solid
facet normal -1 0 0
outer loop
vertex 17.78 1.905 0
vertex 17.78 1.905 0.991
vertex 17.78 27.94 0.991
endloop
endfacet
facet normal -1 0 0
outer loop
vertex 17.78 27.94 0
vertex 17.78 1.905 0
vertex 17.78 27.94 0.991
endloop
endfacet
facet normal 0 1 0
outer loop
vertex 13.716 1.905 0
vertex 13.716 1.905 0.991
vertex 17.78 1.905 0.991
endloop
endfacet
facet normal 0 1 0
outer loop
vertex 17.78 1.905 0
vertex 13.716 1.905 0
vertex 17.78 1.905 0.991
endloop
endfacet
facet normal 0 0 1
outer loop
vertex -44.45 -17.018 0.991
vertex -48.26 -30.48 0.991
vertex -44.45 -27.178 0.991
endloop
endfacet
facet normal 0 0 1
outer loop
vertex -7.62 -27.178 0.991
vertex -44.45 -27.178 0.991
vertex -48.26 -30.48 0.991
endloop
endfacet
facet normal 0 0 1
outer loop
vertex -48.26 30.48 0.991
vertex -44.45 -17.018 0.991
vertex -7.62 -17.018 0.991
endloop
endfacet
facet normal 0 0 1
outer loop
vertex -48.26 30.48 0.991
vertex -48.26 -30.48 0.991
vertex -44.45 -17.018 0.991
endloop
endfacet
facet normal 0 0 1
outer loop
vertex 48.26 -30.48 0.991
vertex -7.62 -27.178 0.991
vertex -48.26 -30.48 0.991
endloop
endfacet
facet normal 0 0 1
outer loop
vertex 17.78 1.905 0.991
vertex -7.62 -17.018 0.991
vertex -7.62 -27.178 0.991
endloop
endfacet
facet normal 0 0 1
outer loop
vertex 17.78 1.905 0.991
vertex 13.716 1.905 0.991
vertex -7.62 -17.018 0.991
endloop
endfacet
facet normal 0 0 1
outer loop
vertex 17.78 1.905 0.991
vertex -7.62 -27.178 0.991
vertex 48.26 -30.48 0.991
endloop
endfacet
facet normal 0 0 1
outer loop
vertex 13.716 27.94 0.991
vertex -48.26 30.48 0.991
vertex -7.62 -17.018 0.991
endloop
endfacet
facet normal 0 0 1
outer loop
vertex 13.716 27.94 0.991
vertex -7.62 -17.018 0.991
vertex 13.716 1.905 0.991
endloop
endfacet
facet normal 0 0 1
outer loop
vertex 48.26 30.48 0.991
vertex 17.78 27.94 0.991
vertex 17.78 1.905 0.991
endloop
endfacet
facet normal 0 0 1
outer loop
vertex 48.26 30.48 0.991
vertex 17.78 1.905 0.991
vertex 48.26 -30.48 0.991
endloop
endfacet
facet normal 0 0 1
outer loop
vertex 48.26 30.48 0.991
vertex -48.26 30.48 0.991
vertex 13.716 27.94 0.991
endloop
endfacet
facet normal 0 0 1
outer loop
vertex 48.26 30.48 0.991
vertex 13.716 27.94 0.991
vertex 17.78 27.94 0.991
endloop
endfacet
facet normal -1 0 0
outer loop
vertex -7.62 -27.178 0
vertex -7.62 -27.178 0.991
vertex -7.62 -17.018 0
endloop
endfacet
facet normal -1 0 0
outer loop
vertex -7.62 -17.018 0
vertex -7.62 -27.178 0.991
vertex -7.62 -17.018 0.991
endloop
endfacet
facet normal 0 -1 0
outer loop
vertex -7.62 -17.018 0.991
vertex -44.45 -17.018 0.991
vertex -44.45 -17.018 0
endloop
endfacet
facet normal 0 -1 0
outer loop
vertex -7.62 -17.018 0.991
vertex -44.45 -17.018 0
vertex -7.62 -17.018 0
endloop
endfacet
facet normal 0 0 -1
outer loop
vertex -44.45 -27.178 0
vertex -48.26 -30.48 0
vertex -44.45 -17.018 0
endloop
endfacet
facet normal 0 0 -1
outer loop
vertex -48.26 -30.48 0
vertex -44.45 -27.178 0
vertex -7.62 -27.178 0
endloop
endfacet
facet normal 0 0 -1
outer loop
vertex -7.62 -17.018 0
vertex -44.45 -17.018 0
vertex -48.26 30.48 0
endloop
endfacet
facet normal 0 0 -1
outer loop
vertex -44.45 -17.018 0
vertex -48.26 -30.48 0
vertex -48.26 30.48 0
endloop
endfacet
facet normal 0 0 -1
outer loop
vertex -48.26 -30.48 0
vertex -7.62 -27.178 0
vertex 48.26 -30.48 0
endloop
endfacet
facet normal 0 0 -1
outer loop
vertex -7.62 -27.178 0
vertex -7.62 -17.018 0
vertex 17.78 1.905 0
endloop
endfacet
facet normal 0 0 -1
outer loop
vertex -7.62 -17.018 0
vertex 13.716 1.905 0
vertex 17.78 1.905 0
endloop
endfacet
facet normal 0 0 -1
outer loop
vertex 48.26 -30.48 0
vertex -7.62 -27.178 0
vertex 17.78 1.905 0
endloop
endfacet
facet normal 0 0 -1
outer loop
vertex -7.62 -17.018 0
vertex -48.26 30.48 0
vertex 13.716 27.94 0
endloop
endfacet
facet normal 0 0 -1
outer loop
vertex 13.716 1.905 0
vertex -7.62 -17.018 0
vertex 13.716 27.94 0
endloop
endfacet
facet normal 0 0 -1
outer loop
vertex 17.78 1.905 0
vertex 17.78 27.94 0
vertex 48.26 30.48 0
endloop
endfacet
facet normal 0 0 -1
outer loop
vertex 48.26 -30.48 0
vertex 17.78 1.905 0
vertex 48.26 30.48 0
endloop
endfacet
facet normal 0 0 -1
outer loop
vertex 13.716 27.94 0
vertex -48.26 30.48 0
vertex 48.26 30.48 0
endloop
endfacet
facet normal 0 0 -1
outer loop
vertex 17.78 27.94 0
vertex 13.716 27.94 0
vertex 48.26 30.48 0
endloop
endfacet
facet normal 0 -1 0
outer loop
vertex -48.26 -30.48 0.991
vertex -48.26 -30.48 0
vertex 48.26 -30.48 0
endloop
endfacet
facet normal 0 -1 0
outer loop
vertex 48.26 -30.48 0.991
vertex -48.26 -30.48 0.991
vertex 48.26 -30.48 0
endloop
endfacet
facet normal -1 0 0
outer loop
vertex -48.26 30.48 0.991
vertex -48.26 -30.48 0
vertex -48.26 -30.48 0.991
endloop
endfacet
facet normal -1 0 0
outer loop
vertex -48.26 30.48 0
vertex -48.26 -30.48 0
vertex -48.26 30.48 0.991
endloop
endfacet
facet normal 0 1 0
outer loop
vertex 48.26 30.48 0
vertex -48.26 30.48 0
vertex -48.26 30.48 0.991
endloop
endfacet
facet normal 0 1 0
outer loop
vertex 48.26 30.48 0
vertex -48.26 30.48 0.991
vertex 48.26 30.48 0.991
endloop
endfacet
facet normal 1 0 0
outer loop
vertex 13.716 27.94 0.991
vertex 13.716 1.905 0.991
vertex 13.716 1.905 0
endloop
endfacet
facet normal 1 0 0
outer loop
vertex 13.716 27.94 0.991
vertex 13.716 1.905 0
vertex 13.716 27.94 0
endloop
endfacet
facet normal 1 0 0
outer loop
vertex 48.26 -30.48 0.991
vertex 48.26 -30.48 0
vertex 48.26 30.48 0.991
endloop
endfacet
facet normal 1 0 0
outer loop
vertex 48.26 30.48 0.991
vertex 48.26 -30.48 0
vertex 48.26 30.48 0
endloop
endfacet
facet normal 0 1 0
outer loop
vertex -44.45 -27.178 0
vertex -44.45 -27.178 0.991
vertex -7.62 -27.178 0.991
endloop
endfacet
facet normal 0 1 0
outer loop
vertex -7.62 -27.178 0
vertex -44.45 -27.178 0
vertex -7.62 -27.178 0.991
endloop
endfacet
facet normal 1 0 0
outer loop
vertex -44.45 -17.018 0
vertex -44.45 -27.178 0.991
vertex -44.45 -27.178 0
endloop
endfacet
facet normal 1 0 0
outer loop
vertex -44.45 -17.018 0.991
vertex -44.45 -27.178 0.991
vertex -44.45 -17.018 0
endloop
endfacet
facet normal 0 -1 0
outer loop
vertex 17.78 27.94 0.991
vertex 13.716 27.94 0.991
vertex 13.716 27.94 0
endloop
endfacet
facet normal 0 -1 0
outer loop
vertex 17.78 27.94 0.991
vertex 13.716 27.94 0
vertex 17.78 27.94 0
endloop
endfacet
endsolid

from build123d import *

# Parameters (mm, degrees)
SKETCH1_W           = 96.52
SKETCH1_H           = 60.96
BOSS_EXTRUDE1_DEPTH = 0.9906
CUT_EXTRUDE1_REACH  = 2.991
SKETCH2_W           = 36.83
SKETCH2_H           = 10.16
SKETCH2_W_2         = 4.064
SKETCH2_H_2         = 26.035


with BuildPart() as part:
    # Sketch1 → Boss-Extrude1 (new body)
    with BuildSketch(Plane.XY):
        Rectangle(SKETCH1_W, SKETCH1_H)
    extrude(amount=BOSS_EXTRUDE1_DEPTH)

    # Sketch2 → Cut-Extrude1 (cut, up to next)
    with BuildSketch(Plane.XY.offset(0.9906), mode=Mode.PRIVATE) as cut_extrude1_sk1:
        with Locations((-26.035, -22.098)):
            Rectangle(SKETCH2_W, SKETCH2_H)
    cut_extrude1_tool1 = extrude(cut_extrude1_sk1.sketch, amount=-CUT_EXTRUDE1_REACH, mode=Mode.PRIVATE) & part.part
    add(cut_extrude1_tool1.solids().sort_by_distance((-26.035, -22.098, 0.9906))[0], mode=Mode.SUBTRACT)
    # Sketch2 → Cut-Extrude1 (cut, up to next)
    with BuildSketch(Plane.XY.offset(0.9906), mode=Mode.PRIVATE) as cut_extrude1_sk2:
        with Locations((15.748, 14.9225)):
            Rectangle(SKETCH2_W_2, SKETCH2_H_2)
    cut_extrude1_tool2 = extrude(cut_extrude1_sk2.sketch, amount=-CUT_EXTRUDE1_REACH, mode=Mode.PRIVATE) & part.part
    add(cut_extrude1_tool2.solids().sort_by_distance((15.748, 14.9225, 0.9906))[0], mode=Mode.SUBTRACT)


solid = part.part
